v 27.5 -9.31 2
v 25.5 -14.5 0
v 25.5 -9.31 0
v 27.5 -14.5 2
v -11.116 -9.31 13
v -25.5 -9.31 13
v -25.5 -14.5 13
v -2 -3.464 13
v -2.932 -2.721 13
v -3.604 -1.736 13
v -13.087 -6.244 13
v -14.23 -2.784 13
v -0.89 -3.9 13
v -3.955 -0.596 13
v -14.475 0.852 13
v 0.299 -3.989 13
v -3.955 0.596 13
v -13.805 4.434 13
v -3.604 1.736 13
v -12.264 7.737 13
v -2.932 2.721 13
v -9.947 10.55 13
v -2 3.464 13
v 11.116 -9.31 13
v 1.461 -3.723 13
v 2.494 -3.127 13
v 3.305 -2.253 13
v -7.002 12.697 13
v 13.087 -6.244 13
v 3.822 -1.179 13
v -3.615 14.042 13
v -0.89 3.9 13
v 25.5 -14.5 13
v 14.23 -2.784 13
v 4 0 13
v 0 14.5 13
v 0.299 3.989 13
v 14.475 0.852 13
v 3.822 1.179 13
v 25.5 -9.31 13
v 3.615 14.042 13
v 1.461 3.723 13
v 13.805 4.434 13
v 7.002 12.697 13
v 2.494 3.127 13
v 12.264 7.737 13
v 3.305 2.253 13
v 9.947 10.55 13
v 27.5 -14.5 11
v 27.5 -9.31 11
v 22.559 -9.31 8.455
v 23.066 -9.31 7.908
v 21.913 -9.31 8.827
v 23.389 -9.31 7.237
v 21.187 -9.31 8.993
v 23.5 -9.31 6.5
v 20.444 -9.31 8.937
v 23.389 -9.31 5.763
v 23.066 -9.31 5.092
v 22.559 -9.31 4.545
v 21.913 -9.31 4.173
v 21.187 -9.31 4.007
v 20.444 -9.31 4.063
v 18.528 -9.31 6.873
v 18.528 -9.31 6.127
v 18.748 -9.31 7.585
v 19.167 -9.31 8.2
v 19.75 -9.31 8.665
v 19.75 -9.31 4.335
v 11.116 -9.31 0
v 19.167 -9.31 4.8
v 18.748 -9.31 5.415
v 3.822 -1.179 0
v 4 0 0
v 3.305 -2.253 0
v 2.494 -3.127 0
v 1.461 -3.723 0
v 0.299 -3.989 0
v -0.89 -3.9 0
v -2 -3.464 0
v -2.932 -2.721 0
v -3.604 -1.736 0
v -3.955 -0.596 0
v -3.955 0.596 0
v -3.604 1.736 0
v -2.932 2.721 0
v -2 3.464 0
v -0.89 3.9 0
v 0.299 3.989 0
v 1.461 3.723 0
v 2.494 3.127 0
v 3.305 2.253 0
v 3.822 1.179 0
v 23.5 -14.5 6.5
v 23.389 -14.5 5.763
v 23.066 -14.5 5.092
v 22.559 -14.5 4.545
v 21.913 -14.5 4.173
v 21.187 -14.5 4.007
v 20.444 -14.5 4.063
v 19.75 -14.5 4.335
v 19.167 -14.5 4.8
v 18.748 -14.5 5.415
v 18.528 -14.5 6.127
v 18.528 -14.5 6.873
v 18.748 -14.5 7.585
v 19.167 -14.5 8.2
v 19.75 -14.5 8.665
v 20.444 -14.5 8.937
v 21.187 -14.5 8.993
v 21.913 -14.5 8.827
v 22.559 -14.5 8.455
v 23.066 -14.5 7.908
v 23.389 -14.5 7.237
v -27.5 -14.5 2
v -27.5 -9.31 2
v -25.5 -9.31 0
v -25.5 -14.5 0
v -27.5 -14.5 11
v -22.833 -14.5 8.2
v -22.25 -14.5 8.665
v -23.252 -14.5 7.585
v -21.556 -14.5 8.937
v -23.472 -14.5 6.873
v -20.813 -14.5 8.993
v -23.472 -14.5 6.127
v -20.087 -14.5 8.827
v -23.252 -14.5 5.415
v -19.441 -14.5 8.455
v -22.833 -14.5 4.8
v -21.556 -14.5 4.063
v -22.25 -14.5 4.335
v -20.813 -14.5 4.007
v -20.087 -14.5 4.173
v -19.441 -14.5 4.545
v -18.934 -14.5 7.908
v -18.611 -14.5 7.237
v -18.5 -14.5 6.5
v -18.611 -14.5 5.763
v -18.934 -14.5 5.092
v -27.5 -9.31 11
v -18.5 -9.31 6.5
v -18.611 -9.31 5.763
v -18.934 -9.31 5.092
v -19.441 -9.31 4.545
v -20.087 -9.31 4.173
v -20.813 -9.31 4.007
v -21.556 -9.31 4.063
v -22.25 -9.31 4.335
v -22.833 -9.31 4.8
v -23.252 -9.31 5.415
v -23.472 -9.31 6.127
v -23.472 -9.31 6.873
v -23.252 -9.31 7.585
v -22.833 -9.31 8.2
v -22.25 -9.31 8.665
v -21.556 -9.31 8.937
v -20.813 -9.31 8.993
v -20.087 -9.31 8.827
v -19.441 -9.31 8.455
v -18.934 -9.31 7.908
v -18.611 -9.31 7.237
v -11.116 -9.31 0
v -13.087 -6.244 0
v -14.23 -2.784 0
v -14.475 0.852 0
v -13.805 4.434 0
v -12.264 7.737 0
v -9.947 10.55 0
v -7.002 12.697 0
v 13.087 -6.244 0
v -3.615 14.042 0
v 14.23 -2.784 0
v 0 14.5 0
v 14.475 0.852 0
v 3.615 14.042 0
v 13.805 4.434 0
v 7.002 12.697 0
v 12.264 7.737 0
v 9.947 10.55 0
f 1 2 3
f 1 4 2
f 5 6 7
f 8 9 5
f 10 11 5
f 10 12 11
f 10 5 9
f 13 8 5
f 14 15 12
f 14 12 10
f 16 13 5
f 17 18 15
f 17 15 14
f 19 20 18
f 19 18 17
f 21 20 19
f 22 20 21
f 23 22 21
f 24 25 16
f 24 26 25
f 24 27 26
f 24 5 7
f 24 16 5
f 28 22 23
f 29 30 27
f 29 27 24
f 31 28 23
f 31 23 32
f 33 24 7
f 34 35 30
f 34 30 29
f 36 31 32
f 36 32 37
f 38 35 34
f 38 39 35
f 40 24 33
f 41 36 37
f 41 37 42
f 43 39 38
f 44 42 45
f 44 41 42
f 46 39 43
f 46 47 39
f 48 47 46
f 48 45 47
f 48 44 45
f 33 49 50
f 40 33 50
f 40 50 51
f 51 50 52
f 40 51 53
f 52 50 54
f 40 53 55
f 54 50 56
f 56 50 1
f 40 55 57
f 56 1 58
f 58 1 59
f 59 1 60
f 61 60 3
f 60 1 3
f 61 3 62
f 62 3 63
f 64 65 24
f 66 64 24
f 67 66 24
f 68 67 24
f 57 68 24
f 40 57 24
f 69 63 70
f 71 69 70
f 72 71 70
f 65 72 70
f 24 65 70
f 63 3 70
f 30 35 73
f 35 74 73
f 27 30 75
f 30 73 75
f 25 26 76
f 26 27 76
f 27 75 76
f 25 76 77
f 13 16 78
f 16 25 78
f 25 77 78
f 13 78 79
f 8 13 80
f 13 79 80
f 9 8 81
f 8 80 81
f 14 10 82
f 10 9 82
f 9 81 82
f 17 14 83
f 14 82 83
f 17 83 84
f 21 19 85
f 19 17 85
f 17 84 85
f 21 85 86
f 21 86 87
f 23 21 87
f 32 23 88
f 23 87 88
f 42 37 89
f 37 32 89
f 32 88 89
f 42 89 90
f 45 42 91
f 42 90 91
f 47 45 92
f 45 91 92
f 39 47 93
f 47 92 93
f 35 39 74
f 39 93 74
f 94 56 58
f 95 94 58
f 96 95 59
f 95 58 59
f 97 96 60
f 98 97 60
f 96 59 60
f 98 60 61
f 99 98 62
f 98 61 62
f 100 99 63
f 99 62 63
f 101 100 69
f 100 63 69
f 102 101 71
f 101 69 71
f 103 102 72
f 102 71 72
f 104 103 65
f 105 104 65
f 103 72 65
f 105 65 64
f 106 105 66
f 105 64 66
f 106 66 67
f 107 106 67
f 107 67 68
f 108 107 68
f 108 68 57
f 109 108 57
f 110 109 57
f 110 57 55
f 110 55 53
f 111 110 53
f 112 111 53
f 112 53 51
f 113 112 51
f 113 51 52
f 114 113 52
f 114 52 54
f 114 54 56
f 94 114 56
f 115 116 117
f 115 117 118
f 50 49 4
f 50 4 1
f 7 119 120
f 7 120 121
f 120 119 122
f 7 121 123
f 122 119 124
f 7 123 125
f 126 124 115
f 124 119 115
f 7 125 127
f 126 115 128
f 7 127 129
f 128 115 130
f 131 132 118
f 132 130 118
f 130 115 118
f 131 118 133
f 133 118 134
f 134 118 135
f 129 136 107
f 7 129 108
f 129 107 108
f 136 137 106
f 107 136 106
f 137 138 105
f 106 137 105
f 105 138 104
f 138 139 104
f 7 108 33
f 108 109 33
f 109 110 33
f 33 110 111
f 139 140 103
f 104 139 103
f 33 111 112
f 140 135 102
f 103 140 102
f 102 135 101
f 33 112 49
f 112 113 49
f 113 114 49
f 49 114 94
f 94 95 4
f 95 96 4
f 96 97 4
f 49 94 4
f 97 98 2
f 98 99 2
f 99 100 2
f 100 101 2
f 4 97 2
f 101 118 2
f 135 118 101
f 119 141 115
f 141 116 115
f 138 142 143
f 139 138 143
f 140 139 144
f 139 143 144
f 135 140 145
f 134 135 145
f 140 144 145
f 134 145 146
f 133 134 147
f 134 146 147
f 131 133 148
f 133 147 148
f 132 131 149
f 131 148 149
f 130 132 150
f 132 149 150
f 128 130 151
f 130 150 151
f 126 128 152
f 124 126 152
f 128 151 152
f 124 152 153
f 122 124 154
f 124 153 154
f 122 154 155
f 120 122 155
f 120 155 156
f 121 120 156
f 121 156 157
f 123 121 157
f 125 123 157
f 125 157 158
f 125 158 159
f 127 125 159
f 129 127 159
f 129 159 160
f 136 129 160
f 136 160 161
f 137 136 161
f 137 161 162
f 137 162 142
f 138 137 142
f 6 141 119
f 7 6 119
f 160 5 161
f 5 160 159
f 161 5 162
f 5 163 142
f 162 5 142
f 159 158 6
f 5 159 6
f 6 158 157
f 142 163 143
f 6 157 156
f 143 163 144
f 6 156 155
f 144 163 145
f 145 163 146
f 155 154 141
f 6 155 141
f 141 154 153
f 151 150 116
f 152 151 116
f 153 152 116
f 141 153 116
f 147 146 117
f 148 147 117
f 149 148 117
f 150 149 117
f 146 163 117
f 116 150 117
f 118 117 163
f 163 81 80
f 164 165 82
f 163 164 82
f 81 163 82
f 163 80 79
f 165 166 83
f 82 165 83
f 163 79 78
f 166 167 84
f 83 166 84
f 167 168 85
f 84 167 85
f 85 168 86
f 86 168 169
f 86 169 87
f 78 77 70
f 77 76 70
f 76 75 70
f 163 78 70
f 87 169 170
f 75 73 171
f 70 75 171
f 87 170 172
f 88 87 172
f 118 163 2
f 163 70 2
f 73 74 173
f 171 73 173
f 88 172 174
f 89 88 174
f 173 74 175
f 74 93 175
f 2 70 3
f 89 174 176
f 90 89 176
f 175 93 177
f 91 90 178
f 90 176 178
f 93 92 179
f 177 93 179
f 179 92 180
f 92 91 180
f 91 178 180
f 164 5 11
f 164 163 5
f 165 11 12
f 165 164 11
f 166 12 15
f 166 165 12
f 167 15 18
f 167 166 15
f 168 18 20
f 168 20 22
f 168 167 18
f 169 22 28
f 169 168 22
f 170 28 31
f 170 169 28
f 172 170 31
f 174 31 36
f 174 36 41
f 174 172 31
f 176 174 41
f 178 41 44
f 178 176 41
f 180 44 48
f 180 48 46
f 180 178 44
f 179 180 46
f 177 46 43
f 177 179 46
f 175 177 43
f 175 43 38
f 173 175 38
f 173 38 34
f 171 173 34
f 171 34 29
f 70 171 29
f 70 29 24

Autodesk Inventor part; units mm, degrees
ref_plane "YZ Plane" through (0, 0, 0) normal (1, 0, 0) x (0, 1, 0)
ref_plane "XZ Plane" through (0, 0, 0) normal (0, 1, 0) x (-1, 0, 0)
ref_plane "XY Plane" through (0, 0, 0) normal (0, 0, 1) x (1, 0, 0)
sketch "Sketch1" plane through (0, 0, 0) normal (0, 0, 1) x (1, 0, 0)
  circle A0 centre (0, 0) radius 4
  circle A1 centre (0, 0) radius 14.5
  line L0 (-27.5, -14.5) -> (27.5, -14.5)
  line L1 (27.5, -14.5) -> (27.5, -9.31)
  line L2 (27.5, -9.31) -> (-27.5, -9.31)
  line L3 (-27.5, -9.31) -> (-27.5, -14.5)
  dimension "d0" = 8
  dimension "d1" = 29
  dimension "d2" = 27.5
  dimension "d3" = 27.5
  dimension "d4" = 5.19
extrude "Extrusion1" add sketch "Sketch1" along normal blind 13
sketch "Sketch2" plane through (11.1164, -9.31, 0) normal (0, 1, 0) x (1, 0, 0)
  line L0 (-22.2328, -13) -> (-22.2328, 0) projected
  line L1 (-22.2328, 0) -> (-38.6164, 0) projected
  line L2 (-38.6164, 0) -> (-38.6164, -13) projected
  line L3 (-22.2328, -13) -> (-38.6164, -13) projected
  line L4 (0, 0) -> (0, -13) projected
  line L5 (16.3836, -13) -> (0, -13) projected
  line L6 (16.3836, 0) -> (16.3836, -13) projected
  line L7 (16.3836, 0) -> (0, 0) projected
  circle A0 centre (-32.1164, -6.5) radius 2.5
  circle A1 centre (9.8836, -6.5) radius 2.5
  line L8 (0, 0) -> (0, -13) projected
  line L9 (-22.2328, 0) -> (0, 0) projected
  line L10 (-22.2328, -13) -> (-22.2328, 0) projected
  line L11 (0, -13) -> (-22.2328, -13) projected
  point P0 (-11.1164, 0)
  dimension "d7" = 5
  dimension "d8" = 5
  dimension "d9" = 21
  dimension "d10" = 21
extrude "Extrusion2" cut sketch "Sketch2" against normal through all contours A0 | A1
chamfer "Chamfer1" distance 2 angle 45 4 edges at (-27.5, -11.905, 0) (27.5, -11.905, 0) (27.5, -11.905, 13) (-27.5, -11.905, 13)
properties part number "00_spindel_bearings"
